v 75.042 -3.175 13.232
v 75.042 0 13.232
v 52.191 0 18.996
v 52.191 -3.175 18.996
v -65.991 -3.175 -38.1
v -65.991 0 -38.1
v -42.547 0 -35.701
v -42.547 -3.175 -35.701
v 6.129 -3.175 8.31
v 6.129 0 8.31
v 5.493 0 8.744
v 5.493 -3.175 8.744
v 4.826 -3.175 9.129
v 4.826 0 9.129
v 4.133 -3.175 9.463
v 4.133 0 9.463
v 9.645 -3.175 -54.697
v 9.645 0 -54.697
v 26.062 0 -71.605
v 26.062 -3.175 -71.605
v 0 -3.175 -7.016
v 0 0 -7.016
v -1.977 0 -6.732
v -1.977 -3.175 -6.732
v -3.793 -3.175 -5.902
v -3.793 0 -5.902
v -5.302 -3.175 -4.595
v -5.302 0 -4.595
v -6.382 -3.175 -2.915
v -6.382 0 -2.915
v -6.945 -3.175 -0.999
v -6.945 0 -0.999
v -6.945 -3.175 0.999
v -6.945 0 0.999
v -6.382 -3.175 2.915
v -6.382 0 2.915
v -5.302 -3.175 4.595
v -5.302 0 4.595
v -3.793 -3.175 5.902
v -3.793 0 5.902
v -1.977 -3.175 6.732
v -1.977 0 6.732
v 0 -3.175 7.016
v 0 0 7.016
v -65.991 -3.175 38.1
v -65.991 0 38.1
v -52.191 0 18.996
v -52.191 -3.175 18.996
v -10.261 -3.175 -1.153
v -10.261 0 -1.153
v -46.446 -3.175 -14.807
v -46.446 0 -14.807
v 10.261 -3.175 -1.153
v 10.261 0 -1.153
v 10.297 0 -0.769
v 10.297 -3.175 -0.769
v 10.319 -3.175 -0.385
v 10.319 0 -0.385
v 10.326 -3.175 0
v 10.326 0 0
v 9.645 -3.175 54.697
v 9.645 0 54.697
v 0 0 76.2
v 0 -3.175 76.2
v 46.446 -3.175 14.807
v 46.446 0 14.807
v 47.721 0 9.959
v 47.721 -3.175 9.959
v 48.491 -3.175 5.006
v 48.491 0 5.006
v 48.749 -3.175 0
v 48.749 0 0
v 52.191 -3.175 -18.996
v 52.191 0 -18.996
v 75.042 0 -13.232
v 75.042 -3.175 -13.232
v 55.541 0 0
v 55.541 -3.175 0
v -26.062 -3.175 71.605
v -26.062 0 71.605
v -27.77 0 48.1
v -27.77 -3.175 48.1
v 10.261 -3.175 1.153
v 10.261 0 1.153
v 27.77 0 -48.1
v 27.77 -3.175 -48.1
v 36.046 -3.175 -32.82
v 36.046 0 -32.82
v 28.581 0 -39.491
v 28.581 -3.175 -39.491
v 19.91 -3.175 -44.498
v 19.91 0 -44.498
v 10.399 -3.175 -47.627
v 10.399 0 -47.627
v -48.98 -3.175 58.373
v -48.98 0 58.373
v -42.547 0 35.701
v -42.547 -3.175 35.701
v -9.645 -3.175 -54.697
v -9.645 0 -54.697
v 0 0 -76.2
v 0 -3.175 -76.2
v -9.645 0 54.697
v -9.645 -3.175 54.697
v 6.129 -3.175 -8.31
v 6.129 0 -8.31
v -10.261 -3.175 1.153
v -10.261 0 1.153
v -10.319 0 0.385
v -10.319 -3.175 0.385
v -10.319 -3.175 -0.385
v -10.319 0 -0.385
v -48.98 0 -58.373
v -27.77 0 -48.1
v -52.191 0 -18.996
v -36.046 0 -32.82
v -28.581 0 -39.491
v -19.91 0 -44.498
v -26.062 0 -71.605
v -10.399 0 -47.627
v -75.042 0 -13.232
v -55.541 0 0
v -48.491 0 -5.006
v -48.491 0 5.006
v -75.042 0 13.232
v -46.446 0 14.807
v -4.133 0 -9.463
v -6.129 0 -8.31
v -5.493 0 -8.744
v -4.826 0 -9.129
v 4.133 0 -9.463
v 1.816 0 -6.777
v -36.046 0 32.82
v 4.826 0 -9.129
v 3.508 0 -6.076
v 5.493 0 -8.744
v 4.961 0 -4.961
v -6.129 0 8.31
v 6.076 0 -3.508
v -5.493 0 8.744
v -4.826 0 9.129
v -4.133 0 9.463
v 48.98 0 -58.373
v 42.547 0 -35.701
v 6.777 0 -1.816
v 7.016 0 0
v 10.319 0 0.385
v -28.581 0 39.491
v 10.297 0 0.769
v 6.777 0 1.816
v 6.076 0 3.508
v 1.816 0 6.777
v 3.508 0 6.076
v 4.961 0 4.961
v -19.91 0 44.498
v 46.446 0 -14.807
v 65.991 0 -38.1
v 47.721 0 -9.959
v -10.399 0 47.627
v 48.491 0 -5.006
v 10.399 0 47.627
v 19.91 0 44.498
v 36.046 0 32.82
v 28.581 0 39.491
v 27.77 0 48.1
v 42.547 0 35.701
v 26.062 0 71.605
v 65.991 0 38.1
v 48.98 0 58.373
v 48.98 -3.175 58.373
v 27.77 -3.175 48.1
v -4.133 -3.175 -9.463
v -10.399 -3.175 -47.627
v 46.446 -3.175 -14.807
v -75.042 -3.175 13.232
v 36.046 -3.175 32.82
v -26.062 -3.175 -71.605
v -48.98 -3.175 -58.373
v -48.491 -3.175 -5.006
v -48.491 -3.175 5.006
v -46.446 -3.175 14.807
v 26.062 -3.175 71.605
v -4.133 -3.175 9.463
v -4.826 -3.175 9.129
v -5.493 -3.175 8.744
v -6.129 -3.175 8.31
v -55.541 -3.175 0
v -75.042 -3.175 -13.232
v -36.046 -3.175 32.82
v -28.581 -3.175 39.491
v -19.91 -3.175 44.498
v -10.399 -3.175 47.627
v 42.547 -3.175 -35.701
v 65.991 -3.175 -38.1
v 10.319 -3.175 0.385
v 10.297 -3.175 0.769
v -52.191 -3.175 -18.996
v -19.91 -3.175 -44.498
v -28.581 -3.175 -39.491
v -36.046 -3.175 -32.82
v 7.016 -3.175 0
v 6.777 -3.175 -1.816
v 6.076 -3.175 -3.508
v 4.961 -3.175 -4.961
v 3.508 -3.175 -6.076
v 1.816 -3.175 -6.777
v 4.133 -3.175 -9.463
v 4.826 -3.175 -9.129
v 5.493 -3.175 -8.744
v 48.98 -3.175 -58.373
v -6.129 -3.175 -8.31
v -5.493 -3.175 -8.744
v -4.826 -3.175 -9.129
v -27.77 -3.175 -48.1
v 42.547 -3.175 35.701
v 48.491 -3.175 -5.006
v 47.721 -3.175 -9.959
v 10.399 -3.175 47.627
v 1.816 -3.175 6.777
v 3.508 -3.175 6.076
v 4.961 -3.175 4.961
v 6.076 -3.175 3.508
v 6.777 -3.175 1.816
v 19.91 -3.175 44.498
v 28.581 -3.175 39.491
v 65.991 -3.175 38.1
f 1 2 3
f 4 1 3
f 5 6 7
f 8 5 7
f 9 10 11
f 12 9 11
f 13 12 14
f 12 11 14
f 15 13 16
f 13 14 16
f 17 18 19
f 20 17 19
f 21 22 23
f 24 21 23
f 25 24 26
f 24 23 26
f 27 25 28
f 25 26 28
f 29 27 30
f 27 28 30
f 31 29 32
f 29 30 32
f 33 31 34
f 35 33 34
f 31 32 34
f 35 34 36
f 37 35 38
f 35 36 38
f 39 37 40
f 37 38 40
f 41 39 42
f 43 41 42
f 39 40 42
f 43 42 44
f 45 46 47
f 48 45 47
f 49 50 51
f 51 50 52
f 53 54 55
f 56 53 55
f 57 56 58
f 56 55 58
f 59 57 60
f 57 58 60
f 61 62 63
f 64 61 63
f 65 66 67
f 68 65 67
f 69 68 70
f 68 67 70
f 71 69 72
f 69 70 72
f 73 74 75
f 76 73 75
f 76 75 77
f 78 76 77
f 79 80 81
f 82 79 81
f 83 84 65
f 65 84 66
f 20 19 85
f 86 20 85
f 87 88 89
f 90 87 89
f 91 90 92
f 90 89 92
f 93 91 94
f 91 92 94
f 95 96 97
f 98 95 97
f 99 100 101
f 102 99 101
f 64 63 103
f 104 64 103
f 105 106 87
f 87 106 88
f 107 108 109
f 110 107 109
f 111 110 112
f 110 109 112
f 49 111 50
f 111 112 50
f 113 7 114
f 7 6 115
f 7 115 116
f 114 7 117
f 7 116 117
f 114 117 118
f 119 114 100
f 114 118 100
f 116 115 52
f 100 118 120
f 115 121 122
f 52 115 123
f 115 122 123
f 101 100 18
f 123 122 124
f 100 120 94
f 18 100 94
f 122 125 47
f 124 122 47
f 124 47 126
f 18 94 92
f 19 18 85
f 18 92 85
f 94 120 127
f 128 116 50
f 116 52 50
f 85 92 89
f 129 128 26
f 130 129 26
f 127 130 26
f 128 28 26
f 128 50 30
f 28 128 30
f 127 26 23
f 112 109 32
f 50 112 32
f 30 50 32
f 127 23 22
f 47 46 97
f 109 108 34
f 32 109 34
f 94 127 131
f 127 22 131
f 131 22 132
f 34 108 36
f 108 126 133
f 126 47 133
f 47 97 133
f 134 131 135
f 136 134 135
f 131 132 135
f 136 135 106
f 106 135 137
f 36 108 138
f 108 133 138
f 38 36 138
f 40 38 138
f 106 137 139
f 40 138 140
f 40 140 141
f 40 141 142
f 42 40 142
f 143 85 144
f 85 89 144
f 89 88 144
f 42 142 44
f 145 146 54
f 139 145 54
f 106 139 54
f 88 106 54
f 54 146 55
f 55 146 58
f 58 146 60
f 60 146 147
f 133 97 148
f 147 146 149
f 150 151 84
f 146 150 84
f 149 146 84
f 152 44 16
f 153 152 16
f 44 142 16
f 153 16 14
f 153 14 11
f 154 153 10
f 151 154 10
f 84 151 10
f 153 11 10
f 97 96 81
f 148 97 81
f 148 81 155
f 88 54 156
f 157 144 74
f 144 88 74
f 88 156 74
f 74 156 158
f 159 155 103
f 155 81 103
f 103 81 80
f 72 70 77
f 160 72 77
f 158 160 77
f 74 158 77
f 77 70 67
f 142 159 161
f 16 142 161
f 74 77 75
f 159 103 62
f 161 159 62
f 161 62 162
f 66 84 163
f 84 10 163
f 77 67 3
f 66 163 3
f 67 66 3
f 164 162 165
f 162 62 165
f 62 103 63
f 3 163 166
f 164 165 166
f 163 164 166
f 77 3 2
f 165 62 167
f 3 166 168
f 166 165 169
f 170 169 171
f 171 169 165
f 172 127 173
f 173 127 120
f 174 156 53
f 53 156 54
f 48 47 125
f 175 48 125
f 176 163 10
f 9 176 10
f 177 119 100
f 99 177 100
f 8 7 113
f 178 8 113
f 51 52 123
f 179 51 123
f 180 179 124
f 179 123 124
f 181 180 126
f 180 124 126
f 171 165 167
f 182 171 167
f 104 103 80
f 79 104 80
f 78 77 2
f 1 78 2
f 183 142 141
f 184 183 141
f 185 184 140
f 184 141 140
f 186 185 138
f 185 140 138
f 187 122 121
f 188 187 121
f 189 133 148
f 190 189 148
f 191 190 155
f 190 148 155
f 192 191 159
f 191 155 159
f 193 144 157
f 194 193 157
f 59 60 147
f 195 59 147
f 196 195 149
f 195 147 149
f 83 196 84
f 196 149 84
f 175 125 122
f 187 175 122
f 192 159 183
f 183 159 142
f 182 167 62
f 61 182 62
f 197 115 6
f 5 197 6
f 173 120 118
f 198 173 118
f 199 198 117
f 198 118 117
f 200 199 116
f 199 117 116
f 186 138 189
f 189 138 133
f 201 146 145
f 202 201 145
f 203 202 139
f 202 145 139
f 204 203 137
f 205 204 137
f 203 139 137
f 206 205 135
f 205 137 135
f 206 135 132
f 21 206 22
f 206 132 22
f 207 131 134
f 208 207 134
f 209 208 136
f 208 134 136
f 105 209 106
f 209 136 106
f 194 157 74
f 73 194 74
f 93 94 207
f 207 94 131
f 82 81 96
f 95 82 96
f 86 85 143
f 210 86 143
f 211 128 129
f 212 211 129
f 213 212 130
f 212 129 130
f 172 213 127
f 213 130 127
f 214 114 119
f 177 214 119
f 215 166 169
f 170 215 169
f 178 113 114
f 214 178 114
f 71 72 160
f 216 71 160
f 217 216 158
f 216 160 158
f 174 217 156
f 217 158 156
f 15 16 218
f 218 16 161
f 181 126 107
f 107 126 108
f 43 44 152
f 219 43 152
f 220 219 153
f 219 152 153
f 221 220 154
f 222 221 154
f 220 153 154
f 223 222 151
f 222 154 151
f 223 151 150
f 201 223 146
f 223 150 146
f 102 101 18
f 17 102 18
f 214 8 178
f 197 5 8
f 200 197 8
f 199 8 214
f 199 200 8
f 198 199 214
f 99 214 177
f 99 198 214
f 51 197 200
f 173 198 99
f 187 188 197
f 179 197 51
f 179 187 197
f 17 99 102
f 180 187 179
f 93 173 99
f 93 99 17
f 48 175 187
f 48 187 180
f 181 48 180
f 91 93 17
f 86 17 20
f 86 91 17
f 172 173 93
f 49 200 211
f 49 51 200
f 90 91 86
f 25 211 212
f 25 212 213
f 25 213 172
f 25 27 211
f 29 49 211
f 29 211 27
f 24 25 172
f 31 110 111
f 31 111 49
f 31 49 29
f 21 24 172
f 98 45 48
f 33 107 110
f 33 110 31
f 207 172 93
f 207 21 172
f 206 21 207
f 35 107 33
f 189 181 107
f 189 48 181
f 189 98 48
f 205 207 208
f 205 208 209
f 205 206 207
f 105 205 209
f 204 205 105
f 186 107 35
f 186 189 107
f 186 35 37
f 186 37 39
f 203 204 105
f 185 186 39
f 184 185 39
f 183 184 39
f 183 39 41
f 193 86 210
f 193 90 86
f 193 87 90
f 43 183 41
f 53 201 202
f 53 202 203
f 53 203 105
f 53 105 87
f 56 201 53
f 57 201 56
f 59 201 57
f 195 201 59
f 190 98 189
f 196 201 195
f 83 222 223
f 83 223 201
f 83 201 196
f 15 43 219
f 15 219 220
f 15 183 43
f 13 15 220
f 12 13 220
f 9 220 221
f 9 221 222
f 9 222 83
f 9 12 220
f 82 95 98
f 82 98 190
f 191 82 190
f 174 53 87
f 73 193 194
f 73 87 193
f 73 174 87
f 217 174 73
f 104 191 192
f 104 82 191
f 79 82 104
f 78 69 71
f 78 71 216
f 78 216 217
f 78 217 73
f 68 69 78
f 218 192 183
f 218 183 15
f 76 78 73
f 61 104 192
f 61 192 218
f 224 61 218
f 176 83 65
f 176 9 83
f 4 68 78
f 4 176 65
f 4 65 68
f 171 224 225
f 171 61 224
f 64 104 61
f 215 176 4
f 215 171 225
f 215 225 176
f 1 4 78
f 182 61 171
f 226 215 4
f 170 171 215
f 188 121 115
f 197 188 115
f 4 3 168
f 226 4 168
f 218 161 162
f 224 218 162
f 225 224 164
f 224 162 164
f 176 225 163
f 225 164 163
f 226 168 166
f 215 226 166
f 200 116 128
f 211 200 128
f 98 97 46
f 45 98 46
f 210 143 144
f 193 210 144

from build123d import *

# Parameters (mm, degrees)
F1_DEPTH = 3.175


with BuildPart() as f1:
    # F0 (on Front) → F1 (new body)
    with BuildSketch(Plane.XZ):
        with BuildLine():
            ThreePointArc((54.0144752369, 1.0356873286), (54.0219214454, 0.5178674576), (54.0244035909, 0))
            ThreePointArc((54.0244035909, 0), (54.0219214454, -0.5178674576), (54.0144752369, -1.0356873286))
            Line((54.0144752369, -1.0356873286), (55.5408836359, 0))
            Line((55.5408836359, 0), (54.0144752369, 1.0356873286))
        make_face()
        with BuildLine():
            ThreePointArc((51.1112297243, 17.5008108221), (53.2036515082, 9.3812392331), (54.0144752369, 1.0356873286))
            Line((54.0144752369, 1.0356873286), (55.5408836359, 0))
            Line((55.5408836359, 0), (75.0423507795, 13.2319911382))
            Line((75.0423507795, 13.2319911382), (52.1913585045, 18.9961009816))
            Line((52.1913585045, 18.9961009816), (51.1112297243, 17.5008108221))
        make_face()
        with BuildLine():
            Line((55.5408836359, 0), (54.0144752369, -1.0356873286))
            ThreePointArc((54.0144752369, -1.0356873286), (53.2036515082, -9.3812392331), (51.1112297243, -17.5008108221))
            Line((51.1112297243, -17.5008108221), (52.1913585045, -18.9961009816))
            Line((52.1913585045, -18.9961009816), (75.0423507795, -13.2319911382))
            Line((75.0423507795, -13.2319911382), (55.5408836359, 0))
        make_face()
        with BuildLine():
            ThreePointArc((50.4027778671, 19.4472663023), (50.7663333968, 18.4774342593), (51.1112297243, 17.5008108221))
            Line((51.1112297243, 17.5008108221), (52.1913585045, 18.9961009816))
            Line((52.1913585045, 18.9961009816), (50.4027778671, 19.4472663023))
        make_face()
        with BuildLine():
            Line((52.1913585045, -18.9961009816), (51.1112297243, -17.5008108221))
            ThreePointArc((51.1112297243, -17.5008108221), (50.7663333968, -18.4774342593), (50.4027778671, -19.4472663023))
            Line((50.4027778671, -19.4472663023), (52.1913585045, -18.9961009816))
        make_face()
        with BuildLine():
            ThreePointArc((42.0432155855, 33.9264529031), (46.786505934, 27.0122017955), (50.4027778671, 19.4472663023))
            Line((50.4027778671, 19.4472663023), (52.1913585045, 18.9961009816))
            Line((52.1913585045, 18.9961009816), (65.9911357684, 38.1))
            Line((65.9911357684, 38.1), (42.5467852752, 35.7009918322))
            Line((42.5467852752, 35.7009918322), (42.0432155855, 33.9264529031))
        make_face()
        with BuildLine():
            Line((52.1913585045, -18.9961009816), (50.4027778671, -19.4472663023))
            ThreePointArc((50.4027778671, -19.4472663023), (46.786505934, -27.0122017955), (42.0432155855, -33.9264529031))
            Line((42.0432155855, -33.9264529031), (42.5467852752, -35.7009918322))
            Line((42.5467852752, -35.7009918322), (65.9911357684, -38.1))
            Line((65.9911357684, -38.1), (52.1913585045, -18.9961009816))
        make_face()
        with BuildLine():
            ThreePointArc((40.7117616209, 35.5132179488), (41.3850941636, 34.726217249), (42.0432155855, 33.9264529031))
            Line((42.0432155855, 33.9264529031), (42.5467852752, 35.7009918322))
            Line((42.5467852752, 35.7009918322), (40.7117616209, 35.5132179488))
        make_face()
        with BuildLine():
            Line((42.5467852752, -35.7009918322), (42.0432155855, -33.9264529031))
            ThreePointArc((42.0432155855, -33.9264529031), (41.3850941636, -34.726217249), (40.7117616209, -35.5132179488))
            Line((40.7117616209, -35.5132179488), (42.5467852752, -35.7009918322))
        make_face()
        with BuildLine():
            ThreePointArc((27.9041691553, 46.2600640629), (34.726217249, 41.3850941636), (40.7117616209, 35.5132179488))
            Line((40.7117616209, 35.5132179488), (42.5467852752, 35.7009918322))
            Line((42.5467852752, 35.7009918322), (48.9804158581, 58.3725865657))
            Line((48.9804158581, 58.3725865657), (27.7704418179, 48.0998161773))
            Line((27.7704418179, 48.0998161773), (27.9041691553, 46.2600640629))
        make_face()
        with BuildLine():
            Line((42.5467852752, -35.7009918322), (40.7117616209, -35.5132179488))
            ThreePointArc((40.7117616209, -35.5132179488), (34.726217249, -41.3850941636), (27.9041691553, -46.2600640629))
            Line((27.9041691553, -46.2600640629), (27.7704418179, -48.0998161773))
            Line((27.7704418179, -48.0998161773), (48.9804158581, -58.3725865657))
            Line((48.9804158581, -58.3725865657), (42.5467852752, -35.7009918322))
        make_face()
        with BuildLine():
            ThreePointArc((26.1103060815, 47.2957513915), (27.0122017955, 46.786505934), (27.9041691553, 46.2600640629))
            Line((27.9041691553, 46.2600640629), (27.7704418179, 48.0998161773))
            Line((27.7704418179, 48.0998161773), (26.1103060815, 47.2957513915))
        make_face()
        with BuildLine():
            Line((27.7704418179, -48.0998161773), (27.9041691553, -46.2600640629))
            ThreePointArc((27.9041691553, -46.2600640629), (27.0122017955, -46.786505934), (26.1103060815, -47.2957513915))
            Line((26.1103060815, -47.2957513915), (27.7704418179, -48.0998161773))
        make_face()
        with BuildLine():
            ThreePointArc((10.3994681034, 53.0140287709), (18.4774342593, 50.7663333968), (26.1103060815, 47.2957513915))
            Line((26.1103060815, 47.2957513915), (27.7704418179, 48.0998161773))
            Line((27.7704418179, 48.0998161773), (26.0619349214, 71.6045777039))
            Line((26.0619349214, 71.6045777039), (9.6445732294, 54.6970928137))
            Line((9.6445732294, 54.6970928137), (10.3994681034, 53.0140287709))
        make_face()
        with BuildLine():
            Line((27.7704418179, -48.0998161773), (26.1103060815, -47.2957513915))
            ThreePointArc((26.1103060815, -47.2957513915), (18.4774342593, -50.7663333968), (10.3994681034, -53.0140287709))
            Line((10.3994681034, -53.0140287709), (9.6445732294, -54.6970928137))
            Line((9.6445732294, -54.6970928137), (26.0619349214, -71.6045777039))
            Line((26.0619349214, -71.6045777039), (27.7704418179, -48.0998161773))
        make_face()
        with BuildLine():
            ThreePointArc((8.3595622817, 53.3737192054), (9.3812392331, 53.2036515082), (10.3994681034, 53.0140287709))
            Line((10.3994681034, 53.0140287709), (9.6445732294, 54.6970928137))
            Line((9.6445732294, 54.6970928137), (8.3595622817, 53.3737192054))
        make_face()
        with BuildLine():
            Line((9.6445732294, -54.6970928137), (10.3994681034, -53.0140287709))
            ThreePointArc((10.3994681034, -53.0140287709), (9.3812392331, -53.2036515082), (8.3595622817, -53.3737192054))
            Line((8.3595622817, -53.3737192054), (9.6445732294, -54.6970928137))
        make_face()
        with BuildLine():
            ThreePointArc((0, 54.0244035909), (4.1924238726, 53.8614868475), (8.3595622817, 53.3737192054))
            Line((8.3595622817, 53.3737192054), (9.6445732294, 54.6970928137))
            Line((9.6445732294, 54.6970928137), (0, 76.2))
            Line((0, 76.2), (-9.6445732294, 54.6970928137))
            Line((-9.6445732294, 54.6970928137), (-8.3595622817, 53.3737192054))
            ThreePointArc((-8.3595622817, 53.3737192054), (-4.1924238726, 53.8614868475), (0, 54.0244035909))
        make_face()
        with BuildLine():
            Line((9.6445732294, -54.6970928137), (8.3595622817, -53.3737192054))
            ThreePointArc((8.3595622817, -53.3737192054), (4.1924238726, -53.8614868475), (0, -54.0244035909))
            ThreePointArc((0, -54.0244035909), (-4.1924238726, -53.8614868475), (-8.3595622817, -53.3737192054))
            Line((-8.3595622817, -53.3737192054), (-9.6445732294, -54.6970928137))
            Line((-9.6445732294, -54.6970928137), (0, -76.2))
            Line((0, -76.2), (9.6445732294, -54.6970928137))
        make_face()
        with BuildLine():
            ThreePointArc((-10.3994681034, 53.0140287709), (-9.3812392331, 53.2036515082), (-8.3595622817, 53.3737192054))
            Line((-8.3595622817, 53.3737192054), (-9.6445732294, 54.6970928137))
            Line((-9.6445732294, 54.6970928137), (-10.3994681034, 53.0140287709))
        make_face()
        with BuildLine():
            Line((-10.3994681034, 53.0140287709), (-9.6445732294, 54.6970928137))
            Line((-9.6445732294, 54.6970928137), (-26.0619349214, 71.6045777039))
            Line((-26.0619349214, 71.6045777039), (-27.7704418179, 48.0998161773))
            Line((-27.7704418179, 48.0998161773), (-26.1103060815, 47.2957513915))
            ThreePointArc((-26.1103060815, 47.2957513915), (-18.4774342593, 50.7663333968), (-10.3994681034, 53.0140287709))
        make_face()
        with BuildLine():
            Line((-9.6445732294, -54.6970928137), (-8.3595622817, -53.3737192054))
            ThreePointArc((-8.3595622817, -53.3737192054), (-9.3812392331, -53.2036515082), (-10.3994681034, -53.0140287709))
            Line((-10.3994681034, -53.0140287709), (-9.6445732294, -54.6970928137))
        make_face()
        with BuildLine():
            Line((-26.0619349214, -71.6045777039), (-9.6445732294, -54.6970928137))
            Line((-9.6445732294, -54.6970928137), (-10.3994681034, -53.0140287709))
            ThreePointArc((-10.3994681034, -53.0140287709), (-18.4774342593, -50.7663333968), (-26.1103060815, -47.2957513915))
            Line((-26.1103060815, -47.2957513915), (-27.7704418179, -48.0998161773))
            Line((-27.7704418179, -48.0998161773), (-26.0619349214, -71.6045777039))
        make_face()
        with BuildLine():
            ThreePointArc((-27.9041691553, 46.2600640629), (-27.0122017955, 46.786505934), (-26.1103060815, 47.2957513915))
            Line((-26.1103060815, 47.2957513915), (-27.7704418179, 48.0998161773))
            Line((-27.7704418179, 48.0998161773), (-27.9041691553, 46.2600640629))
        make_face()
        with BuildLine():
            Line((-27.9041691553, 46.2600640629), (-27.7704418179, 48.0998161773))
            Line((-27.7704418179, 48.0998161773), (-48.9804158581, 58.3725865657))
            Line((-48.9804158581, 58.3725865657), (-42.5467852752, 35.7009918322))
            Line((-42.5467852752, 35.7009918322), (-40.7117616209, 35.5132179488))
            ThreePointArc((-40.7117616209, 35.5132179488), (-34.726217249, 41.3850941636), (-27.9041691553, 46.2600640629))
        make_face()
        with BuildLine():
            Line((-27.7704418179, -48.0998161773), (-26.1103060815, -47.2957513915))
            ThreePointArc((-26.1103060815, -47.2957513915), (-27.0122017955, -46.786505934), (-27.9041691553, -46.2600640629))
            Line((-27.9041691553, -46.2600640629), (-27.7704418179, -48.0998161773))
        make_face()
        with BuildLine():
            Line((-48.9804158581, -58.3725865657), (-27.7704418179, -48.0998161773))
            Line((-27.7704418179, -48.0998161773), (-27.9041691553, -46.2600640629))
            ThreePointArc((-27.9041691553, -46.2600640629), (-34.726217249, -41.3850941636), (-40.7117616209, -35.5132179488))
            Line((-40.7117616209, -35.5132179488), (-42.5467852752, -35.7009918322))
            Line((-42.5467852752, -35.7009918322), (-48.9804158581, -58.3725865657))
        make_face()
        with BuildLine():
            ThreePointArc((-42.0432155855, 33.9264529031), (-41.3850941636, 34.726217249), (-40.7117616209, 35.5132179488))
            Line((-40.7117616209, 35.5132179488), (-42.5467852752, 35.7009918322))
            Line((-42.5467852752, 35.7009918322), (-42.0432155855, 33.9264529031))
        make_face()
        with BuildLine():
            Line((-42.0432155855, 33.9264529031), (-42.5467852752, 35.7009918322))
            Line((-42.5467852752, 35.7009918322), (-65.9911357684, 38.1))
            Line((-65.9911357684, 38.1), (-52.1913585045, 18.9961009816))
            Line((-52.1913585045, 18.9961009816), (-50.4027778671, 19.4472663023))
            ThreePointArc((-50.4027778671, 19.4472663023), (-46.786505934, 27.0122017955), (-42.0432155855, 33.9264529031))
        make_face()
        with BuildLine():
            Line((-42.5467852752, -35.7009918322), (-40.7117616209, -35.5132179488))
            ThreePointArc((-40.7117616209, -35.5132179488), (-41.3850941636, -34.726217249), (-42.0432155855, -33.9264529031))
            Line((-42.0432155855, -33.9264529031), (-42.5467852752, -35.7009918322))
        make_face()
        with BuildLine():
            Line((-65.9911357684, -38.1), (-42.5467852752, -35.7009918322))
            Line((-42.5467852752, -35.7009918322), (-42.0432155855, -33.9264529031))
            ThreePointArc((-42.0432155855, -33.9264529031), (-46.786505934, -27.0122017955), (-50.4027778671, -19.4472663023))
            Line((-50.4027778671, -19.4472663023), (-52.1913585045, -18.9961009816))
            Line((-52.1913585045, -18.9961009816), (-65.9911357684, -38.1))
        make_face()
        with BuildLine():
            ThreePointArc((-51.1112297243, 17.5008108221), (-50.7663333968, 18.4774342593), (-50.4027778671, 19.4472663023))
            Line((-50.4027778671, 19.4472663023), (-52.1913585045, 18.9961009816))
            Line((-52.1913585045, 18.9961009816), (-51.1112297243, 17.5008108221))
        make_face()
        with BuildLine():
            Line((-51.1112297243, 17.5008108221), (-52.1913585045, 18.9961009816))
            Line((-52.1913585045, 18.9961009816), (-75.0423507795, 13.2319911382))
            Line((-75.0423507795, 13.2319911382), (-55.5408836359, 0))
            Line((-55.5408836359, 0), (-54.0144752369, 1.0356873286))
            ThreePointArc((-54.0144752369, 1.0356873286), (-53.2036515082, 9.3812392331), (-51.1112297243, 17.5008108221))
        make_face()
        with BuildLine():
            Line((-52.1913585045, -18.9961009816), (-50.4027778671, -19.4472663023))
            ThreePointArc((-50.4027778671, -19.4472663023), (-50.7663333968, -18.4774342593), (-51.1112297243, -17.5008108221))
            Line((-51.1112297243, -17.5008108221), (-52.1913585045, -18.9961009816))
        make_face()
        with BuildLine():
            Line((-75.0423507795, -13.2319911382), (-52.1913585045, -18.9961009816))
            Line((-52.1913585045, -18.9961009816), (-51.1112297243, -17.5008108221))
            ThreePointArc((-51.1112297243, -17.5008108221), (-53.2036515082, -9.3812392331), (-54.0144752369, -1.0356873286))
            Line((-54.0144752369, -1.0356873286), (-55.5408836359, 0))
            Line((-55.5408836359, 0), (-75.0423507795, -13.2319911382))
        make_face()
        with BuildLine():
            ThreePointArc((-54.0144752369, -1.0356873286), (-54.0244035909, 0), (-54.0144752369, 1.0356873286))
            Line((-54.0144752369, 1.0356873286), (-55.5408836359, 0))
            Line((-55.5408836359, 0), (-54.0144752369, -1.0356873286))
        make_face()
        with BuildLine():
            Line((-6.1288269347, 8.3103227771), (-36.0461253584, 32.8195115967))
            ThreePointArc((-36.0461253584, 32.8195115967), (-42.2176813799, 24.3743897093), (-46.4455934617, 14.80710447))
            Line((-46.4455934617, 14.80710447), (-10.261364106, 1.1525584323))
            ThreePointArc((-10.261364106, 1.1525584323), (-8.9424822164, 5.1629445149), (-6.1288269347, 8.3103227771))
        make_face()
        with BuildLine():
            Line((0, 48.7487794185), (0, 54.0244035909))
            ThreePointArc((0, 54.0244035909), (-4.1924238726, 53.8614868475), (-8.3595622817, 53.3737192054))
            ThreePointArc((-8.3595622817, 53.3737192054), (-9.3812392331, 53.2036515082), (-10.3994681034, 53.0140287709))
            ThreePointArc((-10.3994681034, 53.0140287709), (-18.4774342593, 50.7663333968), (-26.1103060815, 47.2957513915))
            ThreePointArc((-26.1103060815, 47.2957513915), (-27.0122017955, 46.786505934), (-27.9041691553, 46.2600640629))
            ThreePointArc((-27.9041691553, 46.2600640629), (-34.726217249, 41.3850941636), (-40.7117616209, 35.5132179488))
            ThreePointArc((-40.7117616209, 35.5132179488), (-41.3850941636, 34.726217249), (-42.0432155855, 33.9264529031))
            ThreePointArc((-42.0432155855, 33.9264529031), (-46.786505934, 27.0122017955), (-50.4027778671, 19.4472663023))
            ThreePointArc((-50.4027778671, 19.4472663023), (-50.7663333968, 18.4774342593), (-51.1112297243, 17.5008108221))
            ThreePointArc((-51.1112297243, 17.5008108221), (-53.2036515082, 9.3812392331), (-54.0144752369, 1.0356873286))
            ThreePointArc((-54.0144752369, 1.0356873286), (-54.0244035909, 0), (-54.0144752369, -1.0356873286))
            ThreePointArc((-54.0144752369, -1.0356873286), (-53.2036515082, -9.3812392331), (-51.1112297243, -17.5008108221))
            ThreePointArc((-51.1112297243, -17.5008108221), (-50.7663333968, -18.4774342593), (-50.4027778671, -19.4472663023))
            ThreePointArc((-50.4027778671, -19.4472663023), (-46.786505934, -27.0122017955), (-42.0432155855, -33.9264529031))
            ThreePointArc((-42.0432155855, -33.9264529031), (-41.3850941636, -34.726217249), (-40.7117616209, -35.5132179488))
            ThreePointArc((-40.7117616209, -35.5132179488), (-34.726217249, -41.3850941636), (-27.9041691553, -46.2600640629))
            ThreePointArc((-27.9041691553, -46.2600640629), (-27.0122017955, -46.786505934), (-26.1103060815, -47.2957513915))
            ThreePointArc((-26.1103060815, -47.2957513915), (-18.4774342593, -50.7663333968), (-10.3994681034, -53.0140287709))
            ThreePointArc((-10.3994681034, -53.0140287709), (-9.3812392331, -53.2036515082), (-8.3595622817, -53.3737192054))
            ThreePointArc((-8.3595622817, -53.3737192054), (-4.1924238726, -53.8614868475), (0, -54.0244035909))
            Line((0, -54.0244035909), (0, -48.7487794185))
            ThreePointArc((0, -48.7487794185), (-5.2299184368, -48.4674266693), (-10.3994681034, -47.6266160667))
            ThreePointArc((-10.3994681034, -47.6266160667), (-24.3743897093, -42.2176813799), (-36.0461253584, -32.8195115967))
            ThreePointArc((-36.0461253584, -32.8195115967), (-42.2176813799, -24.3743897093), (-46.4455934617, -14.80710447))
            ThreePointArc((-46.4455934617, -14.80710447), (-48.7487794185, 0), (-46.4455934617, 14.80710447))
            ThreePointArc((-46.4455934617, 14.80710447), (-42.2176813799, 24.3743897093), (-36.0461253584, 32.8195115967))
            ThreePointArc((-36.0461253584, 32.8195115967), (-24.3743897093, 42.2176813799), (-10.3994681034, 47.6266160667))
            ThreePointArc((-10.3994681034, 47.6266160667), (-5.2299184368, 48.4674266693), (0, 48.7487794185))
        make_face()
        with BuildLine():
            ThreePointArc((54.0144752369, -1.0356873286), (54.0219214454, -0.5178674576), (54.0244035909, 0))
            ThreePointArc((54.0244035909, 0), (54.0219214454, 0.5178674576), (54.0144752369, 1.0356873286))
            ThreePointArc((54.0144752369, 1.0356873286), (53.2036515082, 9.3812392331), (51.1112297243, 17.5008108221))
            ThreePointArc((51.1112297243, 17.5008108221), (50.7663333968, 18.4774342593), (50.4027778671, 19.4472663023))
            ThreePointArc((50.4027778671, 19.4472663023), (46.786505934, 27.0122017955), (42.0432155855, 33.9264529031))
            ThreePointArc((42.0432155855, 33.9264529031), (41.3850941636, 34.726217249), (40.7117616209, 35.5132179488))
            ThreePointArc((40.7117616209, 35.5132179488), (34.726217249, 41.3850941636), (27.9041691553, 46.2600640629))
            ThreePointArc((27.9041691553, 46.2600640629), (27.0122017955, 46.786505934), (26.1103060815, 47.2957513915))
            ThreePointArc((26.1103060815, 47.2957513915), (18.4774342593, 50.7663333968), (10.3994681034, 53.0140287709))
            ThreePointArc((10.3994681034, 53.0140287709), (9.3812392331, 53.2036515082), (8.3595622817, 53.3737192054))
            ThreePointArc((8.3595622817, 53.3737192054), (4.1924238726, 53.8614868475), (0, 54.0244035909))
            Line((0, 54.0244035909), (0, 48.7487794185))
            ThreePointArc((0, 48.7487794185), (5.2299184368, 48.4674266693), (10.3994681034, 47.6266160667))
            ThreePointArc((10.3994681034, 47.6266160667), (24.3743897093, 42.2176813799), (36.0461253584, 32.8195115967))
            ThreePointArc((36.0461253584, 32.8195115967), (42.2176813799, 24.3743897093), (46.4455934617, 14.80710447))
            ThreePointArc((46.4455934617, 14.80710447), (48.1695416494, 7.4925798017), (48.7487794185, 0))
            ThreePointArc((48.7487794185, 0), (48.1695416494, -7.4925798017), (46.4455934617, -14.80710447))
            ThreePointArc((46.4455934617, -14.80710447), (42.2176813799, -24.3743897093), (36.0461253584, -32.8195115967))
            ThreePointArc((36.0461253584, -32.8195115967), (24.3743897093, -42.2176813799), (10.3994681034, -47.6266160667))
            ThreePointArc((10.3994681034, -47.6266160667), (5.2299184368, -48.4674266693), (0, -48.7487794185))
            Line((0, -48.7487794185), (0, -54.0244035909))
            ThreePointArc((0, -54.0244035909), (4.1924238726, -53.8614868475), (8.3595622817, -53.3737192054))
            ThreePointArc((8.3595622817, -53.3737192054), (9.3812392331, -53.2036515082), (10.3994681034, -53.0140287709))
            ThreePointArc((10.3994681034, -53.0140287709), (18.4774342593, -50.7663333968), (26.1103060815, -47.2957513915))
            ThreePointArc((26.1103060815, -47.2957513915), (27.0122017955, -46.786505934), (27.9041691553, -46.2600640629))
            ThreePointArc((27.9041691553, -46.2600640629), (34.726217249, -41.3850941636), (40.7117616209, -35.5132179488))
            ThreePointArc((40.7117616209, -35.5132179488), (41.3850941636, -34.726217249), (42.0432155855, -33.9264529031))
            ThreePointArc((42.0432155855, -33.9264529031), (46.786505934, -27.0122017955), (50.4027778671, -19.4472663023))
            ThreePointArc((50.4027778671, -19.4472663023), (50.7663333968, -18.4774342593), (51.1112297243, -17.5008108221))
            ThreePointArc((51.1112297243, -17.5008108221), (53.2036515082, -9.3812392331), (54.0144752369, -1.0356873286))
        make_face()
        with BuildLine():
            ThreePointArc((10.3994681034, 47.6266160667), (5.2299184368, 48.4674266693), (0, 48.7487794185))
            Line((0, 48.7487794185), (0, 10.3258890298))
            ThreePointArc((0, 10.3258890298), (2.1108437868, 10.1078347218), (4.1325371712, 9.4628812094))
            Line((4.1325371712, 9.4628812094), (10.3994681034, 47.6266160667))
        make_face()
        with BuildLine():
            Line((0, 10.3258890298), (0, 48.7487794185))
            ThreePointArc((0, 48.7487794185), (-5.2299184368, 48.4674266693), (-10.3994681034, 47.6266160667))
            Line((-10.3994681034, 47.6266160667), (-4.1325371712, 9.4628812094))
            ThreePointArc((-4.1325371712, 9.4628812094), (-2.1108437868, 10.1078347218), (0, 10.3258890298))
        make_face()
        with BuildLine():
            ThreePointArc((46.4455934617, 14.80710447), (42.2176813799, 24.3743897093), (36.0461253584, 32.8195115967))
            Line((36.0461253584, 32.8195115967), (6.1288269347, 8.3103227771))
            ThreePointArc((6.1288269347, 8.3103227771), (8.9424822164, 5.1629445149), (10.261364106, 1.1525584323))
            Line((10.261364106, 1.1525584323), (46.4455934617, 14.80710447))
        make_face()
        with BuildLine():
            Line((6.1288269347, -8.3103227771), (36.0461253584, -32.8195115967))
            ThreePointArc((36.0461253584, -32.8195115967), (42.2176813799, -24.3743897093), (46.4455934617, -14.80710447))
            Line((46.4455934617, -14.80710447), (10.261364106, -1.1525584323))
            ThreePointArc((10.261364106, -1.1525584323), (8.9424822164, -5.1629445149), (6.1288269347, -8.3103227771))
        make_face()
        with BuildLine():
            Line((0, -10.3258890298), (0, -48.7487794185))
            ThreePointArc((0, -48.7487794185), (5.2299184368, -48.4674266693), (10.3994681034, -47.6266160667))
            Line((10.3994681034, -47.6266160667), (4.1325371712, -9.4628812094))
            ThreePointArc((4.1325371712, -9.4628812094), (2.1108437868, -10.1078347218), (0, -10.3258890298))
        make_face()
        with BuildLine():
            ThreePointArc((-46.4455934617, -14.80710447), (-42.2176813799, -24.3743897093), (-36.0461253584, -32.8195115967))
            Line((-36.0461253584, -32.8195115967), (-6.1288269347, -8.3103227771))
            ThreePointArc((-6.1288269347, -8.3103227771), (-8.9424822164, -5.1629445149), (-10.261364106, -1.1525584323))
            Line((-10.261364106, -1.1525584323), (-46.4455934617, -14.80710447))
        make_face()
        with BuildLine():
            ThreePointArc((-10.3994681034, -47.6266160667), (-5.2299184368, -48.4674266693), (0, -48.7487794185))
            Line((0, -48.7487794185), (0, -10.3258890298))
            ThreePointArc((0, -10.3258890298), (-2.1108437868, -10.1078347218), (-4.1325371712, -9.4628812094))
            Line((-4.1325371712, -9.4628812094), (-10.3994681034, -47.6266160667))
        make_face()
        with BuildLine():
            Line((0, 7.016177114), (0, 10.3258890298))
            ThreePointArc((0, 10.3258890298), (-2.1108437868, 10.1078347218), (-4.1325371712, 9.4628812094))
            ThreePointArc((-4.1325371712, 9.4628812094), (-5.1629445149, 8.9424822164), (-6.1288269347, 8.3103227771))
            ThreePointArc((-6.1288269347, 8.3103227771), (-8.9424822164, 5.1629445149), (-10.261364106, 1.1525584323))
            ThreePointArc((-10.261364106, 1.1525584323), (-10.3258890298, 0), (-10.261364106, -1.1525584323))
            ThreePointArc((-10.261364106, -1.1525584323), (-8.9424822164, -5.1629445149), (-6.1288269347, -8.3103227771))
            ThreePointArc((-6.1288269347, -8.3103227771), (-5.1629445149, -8.9424822164), (-4.1325371712, -9.4628812094))
            ThreePointArc((-4.1325371712, -9.4628812094), (-2.1108437868, -10.1078347218), (0, -10.3258890298))
            Line((0, -10.3258890298), (0, -7.016177114))
            ThreePointArc((0, -7.016177114), (-7.016177114, 0), (0, 7.016177114))
        make_face()
        with BuildLine():
            ThreePointArc((4.1325371712, 9.4628812094), (2.1108437868, 10.1078347218), (0, 10.3258890298))
            Line((0, 10.3258890298), (0, 7.016177114))
            ThreePointArc((0, 7.016177114), (4.9611864153, 4.9611864153), (7.016177114, 0))
            ThreePointArc((7.016177114, 0), (4.9611864153, -4.9611864153), (0, -7.016177114))
            Line((0, -7.016177114), (0, -10.3258890298))
            ThreePointArc((0, -10.3258890298), (2.1108437868, -10.1078347218), (4.1325371712, -9.4628812094))
            ThreePointArc((4.1325371712, -9.4628812094), (5.1629445149, -8.9424822164), (6.1288269347, -8.3103227771))
            ThreePointArc((6.1288269347, -8.3103227771), (8.9424822164, -5.1629445149), (10.261364106, -1.1525584323))
            ThreePointArc((10.261364106, -1.1525584323), (10.3097451789, -0.5771816018), (10.3258890298, 0))
            ThreePointArc((10.3258890298, 0), (10.3097451789, 0.5771816018), (10.261364106, 1.1525584323))
            ThreePointArc((10.261364106, 1.1525584323), (8.9424822164, 5.1629445149), (6.1288269347, 8.3103227771))
            ThreePointArc((6.1288269347, 8.3103227771), (5.1629445149, 8.9424822164), (4.1325371712, 9.4628812094))
        make_face()
    extrude(amount=F1_DEPTH)


solid = f1.part
